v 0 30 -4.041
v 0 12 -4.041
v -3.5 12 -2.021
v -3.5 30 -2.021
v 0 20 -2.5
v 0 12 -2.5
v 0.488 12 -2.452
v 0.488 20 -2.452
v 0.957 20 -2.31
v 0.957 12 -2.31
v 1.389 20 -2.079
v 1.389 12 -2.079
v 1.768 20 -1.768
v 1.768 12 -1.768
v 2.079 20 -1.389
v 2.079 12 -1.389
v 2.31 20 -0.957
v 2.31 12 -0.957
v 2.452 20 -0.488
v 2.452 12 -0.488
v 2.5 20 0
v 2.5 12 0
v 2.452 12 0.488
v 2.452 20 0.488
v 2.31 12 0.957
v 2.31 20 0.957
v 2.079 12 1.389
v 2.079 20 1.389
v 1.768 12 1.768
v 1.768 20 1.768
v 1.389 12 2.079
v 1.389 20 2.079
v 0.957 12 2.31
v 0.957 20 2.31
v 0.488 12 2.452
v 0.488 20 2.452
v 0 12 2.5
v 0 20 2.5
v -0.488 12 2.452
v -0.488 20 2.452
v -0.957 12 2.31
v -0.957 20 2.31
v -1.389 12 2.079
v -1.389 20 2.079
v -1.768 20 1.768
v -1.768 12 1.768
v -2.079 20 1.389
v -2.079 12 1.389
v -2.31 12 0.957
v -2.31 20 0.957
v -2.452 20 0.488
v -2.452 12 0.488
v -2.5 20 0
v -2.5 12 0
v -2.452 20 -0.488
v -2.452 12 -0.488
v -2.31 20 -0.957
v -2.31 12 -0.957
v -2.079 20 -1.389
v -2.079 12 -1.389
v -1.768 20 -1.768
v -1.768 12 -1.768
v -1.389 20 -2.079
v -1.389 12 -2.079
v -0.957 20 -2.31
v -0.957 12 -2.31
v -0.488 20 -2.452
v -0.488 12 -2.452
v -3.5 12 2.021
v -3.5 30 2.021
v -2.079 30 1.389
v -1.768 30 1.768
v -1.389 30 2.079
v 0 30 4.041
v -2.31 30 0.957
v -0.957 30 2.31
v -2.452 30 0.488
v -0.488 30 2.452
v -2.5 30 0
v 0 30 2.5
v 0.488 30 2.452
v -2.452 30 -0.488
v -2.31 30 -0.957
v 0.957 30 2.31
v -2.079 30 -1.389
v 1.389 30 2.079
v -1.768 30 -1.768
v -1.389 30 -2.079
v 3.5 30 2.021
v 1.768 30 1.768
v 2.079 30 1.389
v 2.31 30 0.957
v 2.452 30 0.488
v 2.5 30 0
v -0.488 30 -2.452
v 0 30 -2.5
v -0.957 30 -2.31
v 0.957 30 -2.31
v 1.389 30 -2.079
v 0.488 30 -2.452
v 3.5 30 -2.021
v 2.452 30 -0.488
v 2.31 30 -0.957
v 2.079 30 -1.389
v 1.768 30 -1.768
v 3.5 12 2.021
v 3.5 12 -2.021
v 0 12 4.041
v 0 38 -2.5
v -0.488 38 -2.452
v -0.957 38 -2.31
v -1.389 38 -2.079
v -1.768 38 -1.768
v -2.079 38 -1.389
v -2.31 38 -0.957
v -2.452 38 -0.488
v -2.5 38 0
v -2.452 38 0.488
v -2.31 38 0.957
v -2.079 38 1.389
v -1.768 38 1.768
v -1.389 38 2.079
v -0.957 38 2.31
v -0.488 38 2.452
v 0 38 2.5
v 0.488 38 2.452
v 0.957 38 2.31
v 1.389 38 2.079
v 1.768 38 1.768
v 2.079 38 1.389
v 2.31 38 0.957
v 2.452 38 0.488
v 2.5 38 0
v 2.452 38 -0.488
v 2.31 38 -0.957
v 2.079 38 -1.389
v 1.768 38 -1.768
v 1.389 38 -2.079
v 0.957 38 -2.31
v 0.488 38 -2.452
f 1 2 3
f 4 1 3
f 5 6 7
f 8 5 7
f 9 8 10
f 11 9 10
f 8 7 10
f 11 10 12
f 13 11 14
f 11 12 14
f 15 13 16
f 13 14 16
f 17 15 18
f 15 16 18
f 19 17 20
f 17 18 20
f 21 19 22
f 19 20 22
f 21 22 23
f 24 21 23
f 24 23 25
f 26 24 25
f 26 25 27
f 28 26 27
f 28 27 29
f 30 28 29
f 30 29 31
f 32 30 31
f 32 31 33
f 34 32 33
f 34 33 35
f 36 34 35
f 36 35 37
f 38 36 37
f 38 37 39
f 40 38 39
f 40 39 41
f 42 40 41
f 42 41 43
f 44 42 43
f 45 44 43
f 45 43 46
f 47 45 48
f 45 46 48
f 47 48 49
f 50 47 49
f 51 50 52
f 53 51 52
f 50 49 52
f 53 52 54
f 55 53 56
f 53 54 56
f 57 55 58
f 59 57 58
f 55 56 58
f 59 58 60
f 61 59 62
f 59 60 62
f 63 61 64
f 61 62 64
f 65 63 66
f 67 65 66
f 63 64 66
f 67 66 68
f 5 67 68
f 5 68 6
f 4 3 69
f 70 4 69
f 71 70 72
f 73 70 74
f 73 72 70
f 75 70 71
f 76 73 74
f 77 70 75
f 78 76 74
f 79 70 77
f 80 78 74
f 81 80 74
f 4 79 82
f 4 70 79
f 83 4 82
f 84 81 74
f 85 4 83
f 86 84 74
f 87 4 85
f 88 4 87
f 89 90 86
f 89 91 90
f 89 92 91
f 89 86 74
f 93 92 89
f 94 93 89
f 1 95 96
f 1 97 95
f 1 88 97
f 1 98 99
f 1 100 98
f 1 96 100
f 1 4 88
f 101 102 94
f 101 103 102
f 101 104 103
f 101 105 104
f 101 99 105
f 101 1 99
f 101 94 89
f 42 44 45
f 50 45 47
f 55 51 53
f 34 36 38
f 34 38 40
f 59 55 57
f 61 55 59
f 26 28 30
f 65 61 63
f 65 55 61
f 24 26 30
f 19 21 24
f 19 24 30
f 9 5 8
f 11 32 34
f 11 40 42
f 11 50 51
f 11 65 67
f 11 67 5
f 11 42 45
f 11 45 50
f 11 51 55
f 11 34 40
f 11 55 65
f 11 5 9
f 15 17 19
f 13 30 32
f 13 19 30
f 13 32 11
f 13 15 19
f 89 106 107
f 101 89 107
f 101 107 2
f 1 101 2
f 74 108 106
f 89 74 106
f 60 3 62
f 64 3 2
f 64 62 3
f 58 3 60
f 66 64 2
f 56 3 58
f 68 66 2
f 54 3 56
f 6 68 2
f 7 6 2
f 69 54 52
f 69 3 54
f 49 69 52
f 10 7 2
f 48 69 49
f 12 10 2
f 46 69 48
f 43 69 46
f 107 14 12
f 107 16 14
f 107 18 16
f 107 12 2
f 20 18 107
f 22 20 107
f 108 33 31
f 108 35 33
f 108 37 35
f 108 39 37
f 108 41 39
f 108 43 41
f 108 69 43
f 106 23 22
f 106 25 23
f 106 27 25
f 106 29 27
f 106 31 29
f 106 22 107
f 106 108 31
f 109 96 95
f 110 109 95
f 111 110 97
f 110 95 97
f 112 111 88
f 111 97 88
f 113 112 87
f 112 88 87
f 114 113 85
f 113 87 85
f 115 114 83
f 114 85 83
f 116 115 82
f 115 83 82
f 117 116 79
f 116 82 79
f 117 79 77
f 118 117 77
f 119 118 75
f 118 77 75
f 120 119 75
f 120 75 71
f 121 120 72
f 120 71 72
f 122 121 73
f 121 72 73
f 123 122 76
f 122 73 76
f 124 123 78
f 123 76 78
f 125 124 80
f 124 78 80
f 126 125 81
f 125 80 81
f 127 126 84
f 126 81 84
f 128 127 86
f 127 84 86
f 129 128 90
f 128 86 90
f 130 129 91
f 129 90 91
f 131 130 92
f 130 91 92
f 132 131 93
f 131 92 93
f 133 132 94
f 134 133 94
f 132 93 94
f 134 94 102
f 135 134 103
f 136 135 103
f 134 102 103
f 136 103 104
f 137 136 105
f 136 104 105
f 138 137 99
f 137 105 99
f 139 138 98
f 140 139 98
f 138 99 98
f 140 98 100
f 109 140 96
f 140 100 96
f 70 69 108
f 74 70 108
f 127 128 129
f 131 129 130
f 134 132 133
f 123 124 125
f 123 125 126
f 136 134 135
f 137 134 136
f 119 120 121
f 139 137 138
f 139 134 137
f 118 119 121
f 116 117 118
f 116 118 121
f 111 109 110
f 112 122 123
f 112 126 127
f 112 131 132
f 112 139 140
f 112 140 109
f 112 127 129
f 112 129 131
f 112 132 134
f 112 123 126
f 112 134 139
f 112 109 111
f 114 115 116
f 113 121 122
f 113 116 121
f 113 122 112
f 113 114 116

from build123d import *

# Parameters (mm, degrees)
EXTRUDE_1_DEPTH      = 30
EXTRUDE_1_DEPTH_BACK = 0.0001
SKETCH_3_R           = 2.5
CUT_EXTRUDE_1_DEPTH  = 20
SKETCH_4_R           = 2.5
EXTRUDE_2_DEPTH      = 8
SKETCH_5_R           = 7.900729049
CUT_EXTRUDE_2_DEPTH  = 2
SKETCH_6_R           = 13.970712395
CUT_EXTRUDE_3_DEPTH  = 10


with BuildPart() as part:
    # 草图2 → 凸台-拉伸1 (new, two sides: drawn at the far end of the back side and taken through both)
    with BuildSketch(Plane(origin=(0, 0, 0), x_dir=(1, 0, 0), z_dir=(0, 1, 0)).offset(-EXTRUDE_1_DEPTH_BACK)):
        Polygon((0, -4.041451884), (3.5, -2.020725942), (3.5, 2.020725942), (0, 4.041451884), (-3.5, 2.020725942), (-3.5, -2.020725942), align=None)
    extrude(amount=EXTRUDE_1_DEPTH + EXTRUDE_1_DEPTH_BACK)

    # 草图3 → 切除-拉伸1 (cut)
    with BuildSketch(Plane.XZ.offset(0.0001)):
        with Locations(Location((0, 0, 0), (0, 0, 270))):
            Circle(SKETCH_3_R)
    extrude(amount=-CUT_EXTRUDE_1_DEPTH, mode=Mode.SUBTRACT)

    # 草图4 → 凸台-拉伸2 (add)
    with BuildSketch(Plane(origin=(0, 30, 0), x_dir=(1, 0, 0), z_dir=(0, 1, 0))):
        with Locations(Location((0, 0, 0), (0, 0, 90))):
            Circle(SKETCH_4_R)
    extrude(amount=EXTRUDE_2_DEPTH)

    # 草图5 → 切除-拉伸2 (cut)
    with BuildSketch(Plane.XZ.offset(0.0001)):
        Circle(SKETCH_5_R)
    extrude(amount=-CUT_EXTRUDE_2_DEPTH, mode=Mode.SUBTRACT)

    # 草图6 → 切除-拉伸3 (cut)
    with BuildSketch(Plane.XZ.offset(-1.9999)):
        with Locations((-3.086044331, 4.465263264)):
            Circle(SKETCH_6_R)
    extrude(amount=-CUT_EXTRUDE_3_DEPTH, mode=Mode.SUBTRACT)


solid = part.part
